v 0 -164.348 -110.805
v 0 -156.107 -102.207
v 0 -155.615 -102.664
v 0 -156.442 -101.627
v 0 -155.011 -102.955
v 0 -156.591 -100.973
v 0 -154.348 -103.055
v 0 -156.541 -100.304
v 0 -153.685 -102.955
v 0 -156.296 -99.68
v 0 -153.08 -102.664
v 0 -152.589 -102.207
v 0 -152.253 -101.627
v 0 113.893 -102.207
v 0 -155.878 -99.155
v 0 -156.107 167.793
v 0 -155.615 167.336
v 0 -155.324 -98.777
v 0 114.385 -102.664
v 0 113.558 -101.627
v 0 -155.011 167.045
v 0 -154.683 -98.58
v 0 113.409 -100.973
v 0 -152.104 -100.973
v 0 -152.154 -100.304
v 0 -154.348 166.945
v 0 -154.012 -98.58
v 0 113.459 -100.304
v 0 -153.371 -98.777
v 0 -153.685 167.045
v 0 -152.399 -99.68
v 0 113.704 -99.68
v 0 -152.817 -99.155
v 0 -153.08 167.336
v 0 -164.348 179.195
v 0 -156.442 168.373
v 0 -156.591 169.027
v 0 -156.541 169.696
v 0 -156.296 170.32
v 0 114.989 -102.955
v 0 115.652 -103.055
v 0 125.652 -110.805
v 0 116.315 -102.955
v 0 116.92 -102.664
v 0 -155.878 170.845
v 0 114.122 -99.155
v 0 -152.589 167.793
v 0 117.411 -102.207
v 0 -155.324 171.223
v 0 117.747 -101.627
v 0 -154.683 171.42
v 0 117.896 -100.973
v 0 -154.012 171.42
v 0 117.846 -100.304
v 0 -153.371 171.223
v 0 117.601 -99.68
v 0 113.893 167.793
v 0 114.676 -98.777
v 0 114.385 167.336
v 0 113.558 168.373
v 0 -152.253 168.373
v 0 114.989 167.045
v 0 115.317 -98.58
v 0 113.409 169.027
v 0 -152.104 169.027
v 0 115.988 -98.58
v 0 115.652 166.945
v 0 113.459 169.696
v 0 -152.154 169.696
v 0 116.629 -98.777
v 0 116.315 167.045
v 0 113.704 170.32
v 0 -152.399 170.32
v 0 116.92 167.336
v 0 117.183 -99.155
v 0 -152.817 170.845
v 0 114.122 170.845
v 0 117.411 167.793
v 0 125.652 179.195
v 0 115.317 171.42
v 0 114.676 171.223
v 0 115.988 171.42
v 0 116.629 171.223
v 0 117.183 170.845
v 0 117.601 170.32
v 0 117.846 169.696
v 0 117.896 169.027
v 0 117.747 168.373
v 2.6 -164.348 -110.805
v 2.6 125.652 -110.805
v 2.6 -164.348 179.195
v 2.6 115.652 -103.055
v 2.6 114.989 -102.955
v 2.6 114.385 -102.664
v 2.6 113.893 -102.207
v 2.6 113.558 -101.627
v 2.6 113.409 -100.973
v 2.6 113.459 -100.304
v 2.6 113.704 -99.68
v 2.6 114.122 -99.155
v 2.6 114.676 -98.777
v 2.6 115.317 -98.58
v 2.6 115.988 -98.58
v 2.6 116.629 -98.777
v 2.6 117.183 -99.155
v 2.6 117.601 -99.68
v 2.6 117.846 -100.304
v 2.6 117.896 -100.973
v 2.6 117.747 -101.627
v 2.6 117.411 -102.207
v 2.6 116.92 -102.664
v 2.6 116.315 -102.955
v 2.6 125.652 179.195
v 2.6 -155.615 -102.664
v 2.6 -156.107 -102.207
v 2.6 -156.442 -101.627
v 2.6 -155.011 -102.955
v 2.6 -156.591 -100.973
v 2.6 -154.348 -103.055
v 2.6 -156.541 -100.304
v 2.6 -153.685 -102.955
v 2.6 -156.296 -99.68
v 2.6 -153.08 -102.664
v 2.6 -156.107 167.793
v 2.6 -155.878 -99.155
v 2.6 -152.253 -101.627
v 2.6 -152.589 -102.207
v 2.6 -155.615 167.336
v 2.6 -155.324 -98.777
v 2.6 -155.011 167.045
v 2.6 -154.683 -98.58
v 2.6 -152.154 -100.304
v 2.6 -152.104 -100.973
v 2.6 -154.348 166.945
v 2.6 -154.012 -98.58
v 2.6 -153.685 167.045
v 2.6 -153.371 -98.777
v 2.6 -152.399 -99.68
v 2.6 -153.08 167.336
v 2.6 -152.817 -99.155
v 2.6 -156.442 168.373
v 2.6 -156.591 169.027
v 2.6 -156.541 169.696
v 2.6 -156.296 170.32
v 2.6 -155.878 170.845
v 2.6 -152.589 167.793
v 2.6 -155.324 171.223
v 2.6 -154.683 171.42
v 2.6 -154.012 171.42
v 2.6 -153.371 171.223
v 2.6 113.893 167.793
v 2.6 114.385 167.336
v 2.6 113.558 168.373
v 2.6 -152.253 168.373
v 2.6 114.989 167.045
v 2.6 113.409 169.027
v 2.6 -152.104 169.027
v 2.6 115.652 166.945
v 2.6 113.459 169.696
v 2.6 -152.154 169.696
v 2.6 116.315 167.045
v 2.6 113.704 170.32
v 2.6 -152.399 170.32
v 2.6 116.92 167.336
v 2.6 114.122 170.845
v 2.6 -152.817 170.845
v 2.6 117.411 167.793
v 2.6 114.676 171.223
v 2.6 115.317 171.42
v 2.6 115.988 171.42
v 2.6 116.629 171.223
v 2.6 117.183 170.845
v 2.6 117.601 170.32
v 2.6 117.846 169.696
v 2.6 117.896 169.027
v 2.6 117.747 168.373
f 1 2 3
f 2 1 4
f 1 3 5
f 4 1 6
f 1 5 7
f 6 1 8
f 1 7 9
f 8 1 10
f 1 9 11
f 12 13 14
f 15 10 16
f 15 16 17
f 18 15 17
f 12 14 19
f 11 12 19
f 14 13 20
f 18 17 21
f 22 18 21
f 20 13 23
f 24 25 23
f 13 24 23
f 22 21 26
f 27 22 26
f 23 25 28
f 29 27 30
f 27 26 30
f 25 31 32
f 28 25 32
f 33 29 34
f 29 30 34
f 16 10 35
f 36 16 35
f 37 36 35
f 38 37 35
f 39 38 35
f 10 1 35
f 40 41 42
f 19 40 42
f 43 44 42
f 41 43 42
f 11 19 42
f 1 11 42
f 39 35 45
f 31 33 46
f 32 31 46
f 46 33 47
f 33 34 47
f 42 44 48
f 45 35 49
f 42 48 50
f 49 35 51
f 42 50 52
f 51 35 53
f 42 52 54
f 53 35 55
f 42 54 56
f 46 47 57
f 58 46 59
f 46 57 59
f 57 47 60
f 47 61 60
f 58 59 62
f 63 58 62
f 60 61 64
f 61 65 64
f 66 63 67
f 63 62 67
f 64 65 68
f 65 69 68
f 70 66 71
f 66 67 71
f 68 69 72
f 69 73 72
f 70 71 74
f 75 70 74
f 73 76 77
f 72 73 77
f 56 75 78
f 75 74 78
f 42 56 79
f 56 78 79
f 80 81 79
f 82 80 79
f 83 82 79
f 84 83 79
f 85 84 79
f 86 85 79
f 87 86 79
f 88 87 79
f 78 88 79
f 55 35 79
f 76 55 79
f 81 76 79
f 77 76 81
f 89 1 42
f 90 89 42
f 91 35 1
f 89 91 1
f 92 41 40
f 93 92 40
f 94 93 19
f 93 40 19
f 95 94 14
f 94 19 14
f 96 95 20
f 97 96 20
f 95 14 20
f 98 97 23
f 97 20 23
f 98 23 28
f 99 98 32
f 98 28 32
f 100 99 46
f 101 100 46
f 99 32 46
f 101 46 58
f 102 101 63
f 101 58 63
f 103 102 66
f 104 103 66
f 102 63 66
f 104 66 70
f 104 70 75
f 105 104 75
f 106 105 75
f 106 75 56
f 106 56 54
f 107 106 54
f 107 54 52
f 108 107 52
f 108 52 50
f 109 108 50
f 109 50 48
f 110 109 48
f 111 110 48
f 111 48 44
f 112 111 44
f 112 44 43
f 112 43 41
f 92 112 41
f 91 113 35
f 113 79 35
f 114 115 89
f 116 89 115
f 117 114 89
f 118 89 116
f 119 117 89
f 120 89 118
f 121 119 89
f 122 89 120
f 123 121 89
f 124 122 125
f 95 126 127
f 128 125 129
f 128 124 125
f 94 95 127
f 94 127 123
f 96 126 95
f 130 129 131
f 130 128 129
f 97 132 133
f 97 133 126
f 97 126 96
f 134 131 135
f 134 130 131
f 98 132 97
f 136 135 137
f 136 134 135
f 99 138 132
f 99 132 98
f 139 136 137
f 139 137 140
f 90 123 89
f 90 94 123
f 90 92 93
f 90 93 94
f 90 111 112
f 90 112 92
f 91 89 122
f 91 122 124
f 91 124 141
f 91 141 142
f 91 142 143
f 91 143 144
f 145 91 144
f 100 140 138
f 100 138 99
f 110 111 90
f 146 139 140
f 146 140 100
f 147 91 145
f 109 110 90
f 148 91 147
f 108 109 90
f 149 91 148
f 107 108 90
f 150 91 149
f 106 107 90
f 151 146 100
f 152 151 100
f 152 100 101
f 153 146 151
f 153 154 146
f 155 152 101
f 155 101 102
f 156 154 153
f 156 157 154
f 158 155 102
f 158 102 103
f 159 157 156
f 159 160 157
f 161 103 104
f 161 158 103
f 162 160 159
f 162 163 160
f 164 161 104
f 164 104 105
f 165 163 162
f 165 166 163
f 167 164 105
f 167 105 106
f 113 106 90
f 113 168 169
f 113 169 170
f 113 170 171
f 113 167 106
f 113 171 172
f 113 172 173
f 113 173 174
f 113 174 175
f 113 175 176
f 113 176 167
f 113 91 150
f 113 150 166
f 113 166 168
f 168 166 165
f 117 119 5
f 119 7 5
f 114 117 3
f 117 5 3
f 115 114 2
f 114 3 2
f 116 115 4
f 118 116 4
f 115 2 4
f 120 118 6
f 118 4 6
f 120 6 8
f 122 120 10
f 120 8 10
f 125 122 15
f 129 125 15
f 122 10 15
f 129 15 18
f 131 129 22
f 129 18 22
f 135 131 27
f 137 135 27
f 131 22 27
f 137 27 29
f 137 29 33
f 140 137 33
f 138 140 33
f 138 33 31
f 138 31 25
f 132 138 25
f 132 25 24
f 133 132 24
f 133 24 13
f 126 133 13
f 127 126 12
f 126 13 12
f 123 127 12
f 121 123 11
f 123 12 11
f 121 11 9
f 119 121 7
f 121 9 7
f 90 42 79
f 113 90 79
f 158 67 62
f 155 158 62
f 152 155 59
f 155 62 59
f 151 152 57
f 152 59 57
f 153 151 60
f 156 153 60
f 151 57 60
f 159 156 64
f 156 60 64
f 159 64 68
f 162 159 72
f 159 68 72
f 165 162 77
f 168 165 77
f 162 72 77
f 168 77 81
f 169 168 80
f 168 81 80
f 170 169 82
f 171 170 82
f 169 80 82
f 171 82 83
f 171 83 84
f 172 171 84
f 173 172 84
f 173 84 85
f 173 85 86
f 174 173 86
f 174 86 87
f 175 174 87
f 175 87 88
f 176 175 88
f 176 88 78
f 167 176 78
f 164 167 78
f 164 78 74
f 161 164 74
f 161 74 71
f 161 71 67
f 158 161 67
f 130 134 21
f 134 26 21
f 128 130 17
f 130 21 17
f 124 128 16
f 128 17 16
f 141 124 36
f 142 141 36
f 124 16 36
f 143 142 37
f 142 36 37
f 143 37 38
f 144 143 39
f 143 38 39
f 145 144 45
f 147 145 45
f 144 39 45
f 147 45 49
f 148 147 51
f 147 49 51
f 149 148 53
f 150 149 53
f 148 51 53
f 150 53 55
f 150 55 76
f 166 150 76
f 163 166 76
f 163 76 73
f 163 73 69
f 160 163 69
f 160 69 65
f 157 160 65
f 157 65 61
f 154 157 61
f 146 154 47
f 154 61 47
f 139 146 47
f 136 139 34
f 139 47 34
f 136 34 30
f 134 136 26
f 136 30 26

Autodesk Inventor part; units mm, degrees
ref_plane "YZ Plane" through (0, 0, 0) normal (1, 0, 0) x (0, 1, 0)
ref_plane "XZ Plane" through (0, 0, 0) normal (0, 1, 0) x (-1, 0, 0)
ref_plane "XY Plane" through (0, 0, 0) normal (0, 0, 1) x (1, 0, 0)
sketch "スケッチ1" plane through (0, 0, 0) normal (1, 0, 0) x (0, 1, 0)
  line L0 (125.6523, 179.1954) -> (-164.3477, 179.1954)
  line L1 (-164.3477, 179.1954) -> (-164.3477, -110.8046)
  line L2 (-164.3477, -110.8046) -> (125.6523, -110.8046)
  line L3 (125.6523, -110.8046) -> (125.6523, 179.1954)
  point P0 (0, 0)
  dimension "d0" = 290
  dimension "d1" = 290
extrude "押し出し1" add sketch "スケッチ1" along normal blind 2.6
sketch "スケッチ2" plane through (2.6, 0, 0) normal (1, 0, 0) x (0, 0, -1)
  line L0 (-179.1954, 125.6523) -> (-179.1954, -164.3477) projected
  line L1 (-179.1954, -164.3477) -> (110.8046, -164.3477) projected
  line L2 (110.8046, -164.3477) -> (110.8046, 125.6523) projected
  line L3 (110.8046, 125.6523) -> (-179.1954, 125.6523) projected
  line L4 (-34.1954, -19.3477) -> (-34.1954, 125.6523)
  line L5 (110.8046, 125.6523) -> (-179.1954, 125.6523) projected
  line L6 (-34.1954, -19.3477) -> (110.8046, -19.3477)
  point P0 (0, 0)
  point P1 (-169.1954, 115.6523)
  point P2 (100.8046, 115.6523)
  point P3 (-169.1954, -154.3477)
  point P4 (100.8046, -154.3477)
  dimension "d4" = 10
  dimension "d5" = 10
hole "穴1" at (2.6, 115.6523, 169.1954) at (2.6, 115.6523, -100.8046) at (2.6, -154.3477, 169.1954) at (2.6, -154.3477, -100.8046) direction (-1, 0, 0) diameter 4.5 depth 10 tip angle 118
properties part number "lc_box_side" material "ポリカーボネート、クリア"
